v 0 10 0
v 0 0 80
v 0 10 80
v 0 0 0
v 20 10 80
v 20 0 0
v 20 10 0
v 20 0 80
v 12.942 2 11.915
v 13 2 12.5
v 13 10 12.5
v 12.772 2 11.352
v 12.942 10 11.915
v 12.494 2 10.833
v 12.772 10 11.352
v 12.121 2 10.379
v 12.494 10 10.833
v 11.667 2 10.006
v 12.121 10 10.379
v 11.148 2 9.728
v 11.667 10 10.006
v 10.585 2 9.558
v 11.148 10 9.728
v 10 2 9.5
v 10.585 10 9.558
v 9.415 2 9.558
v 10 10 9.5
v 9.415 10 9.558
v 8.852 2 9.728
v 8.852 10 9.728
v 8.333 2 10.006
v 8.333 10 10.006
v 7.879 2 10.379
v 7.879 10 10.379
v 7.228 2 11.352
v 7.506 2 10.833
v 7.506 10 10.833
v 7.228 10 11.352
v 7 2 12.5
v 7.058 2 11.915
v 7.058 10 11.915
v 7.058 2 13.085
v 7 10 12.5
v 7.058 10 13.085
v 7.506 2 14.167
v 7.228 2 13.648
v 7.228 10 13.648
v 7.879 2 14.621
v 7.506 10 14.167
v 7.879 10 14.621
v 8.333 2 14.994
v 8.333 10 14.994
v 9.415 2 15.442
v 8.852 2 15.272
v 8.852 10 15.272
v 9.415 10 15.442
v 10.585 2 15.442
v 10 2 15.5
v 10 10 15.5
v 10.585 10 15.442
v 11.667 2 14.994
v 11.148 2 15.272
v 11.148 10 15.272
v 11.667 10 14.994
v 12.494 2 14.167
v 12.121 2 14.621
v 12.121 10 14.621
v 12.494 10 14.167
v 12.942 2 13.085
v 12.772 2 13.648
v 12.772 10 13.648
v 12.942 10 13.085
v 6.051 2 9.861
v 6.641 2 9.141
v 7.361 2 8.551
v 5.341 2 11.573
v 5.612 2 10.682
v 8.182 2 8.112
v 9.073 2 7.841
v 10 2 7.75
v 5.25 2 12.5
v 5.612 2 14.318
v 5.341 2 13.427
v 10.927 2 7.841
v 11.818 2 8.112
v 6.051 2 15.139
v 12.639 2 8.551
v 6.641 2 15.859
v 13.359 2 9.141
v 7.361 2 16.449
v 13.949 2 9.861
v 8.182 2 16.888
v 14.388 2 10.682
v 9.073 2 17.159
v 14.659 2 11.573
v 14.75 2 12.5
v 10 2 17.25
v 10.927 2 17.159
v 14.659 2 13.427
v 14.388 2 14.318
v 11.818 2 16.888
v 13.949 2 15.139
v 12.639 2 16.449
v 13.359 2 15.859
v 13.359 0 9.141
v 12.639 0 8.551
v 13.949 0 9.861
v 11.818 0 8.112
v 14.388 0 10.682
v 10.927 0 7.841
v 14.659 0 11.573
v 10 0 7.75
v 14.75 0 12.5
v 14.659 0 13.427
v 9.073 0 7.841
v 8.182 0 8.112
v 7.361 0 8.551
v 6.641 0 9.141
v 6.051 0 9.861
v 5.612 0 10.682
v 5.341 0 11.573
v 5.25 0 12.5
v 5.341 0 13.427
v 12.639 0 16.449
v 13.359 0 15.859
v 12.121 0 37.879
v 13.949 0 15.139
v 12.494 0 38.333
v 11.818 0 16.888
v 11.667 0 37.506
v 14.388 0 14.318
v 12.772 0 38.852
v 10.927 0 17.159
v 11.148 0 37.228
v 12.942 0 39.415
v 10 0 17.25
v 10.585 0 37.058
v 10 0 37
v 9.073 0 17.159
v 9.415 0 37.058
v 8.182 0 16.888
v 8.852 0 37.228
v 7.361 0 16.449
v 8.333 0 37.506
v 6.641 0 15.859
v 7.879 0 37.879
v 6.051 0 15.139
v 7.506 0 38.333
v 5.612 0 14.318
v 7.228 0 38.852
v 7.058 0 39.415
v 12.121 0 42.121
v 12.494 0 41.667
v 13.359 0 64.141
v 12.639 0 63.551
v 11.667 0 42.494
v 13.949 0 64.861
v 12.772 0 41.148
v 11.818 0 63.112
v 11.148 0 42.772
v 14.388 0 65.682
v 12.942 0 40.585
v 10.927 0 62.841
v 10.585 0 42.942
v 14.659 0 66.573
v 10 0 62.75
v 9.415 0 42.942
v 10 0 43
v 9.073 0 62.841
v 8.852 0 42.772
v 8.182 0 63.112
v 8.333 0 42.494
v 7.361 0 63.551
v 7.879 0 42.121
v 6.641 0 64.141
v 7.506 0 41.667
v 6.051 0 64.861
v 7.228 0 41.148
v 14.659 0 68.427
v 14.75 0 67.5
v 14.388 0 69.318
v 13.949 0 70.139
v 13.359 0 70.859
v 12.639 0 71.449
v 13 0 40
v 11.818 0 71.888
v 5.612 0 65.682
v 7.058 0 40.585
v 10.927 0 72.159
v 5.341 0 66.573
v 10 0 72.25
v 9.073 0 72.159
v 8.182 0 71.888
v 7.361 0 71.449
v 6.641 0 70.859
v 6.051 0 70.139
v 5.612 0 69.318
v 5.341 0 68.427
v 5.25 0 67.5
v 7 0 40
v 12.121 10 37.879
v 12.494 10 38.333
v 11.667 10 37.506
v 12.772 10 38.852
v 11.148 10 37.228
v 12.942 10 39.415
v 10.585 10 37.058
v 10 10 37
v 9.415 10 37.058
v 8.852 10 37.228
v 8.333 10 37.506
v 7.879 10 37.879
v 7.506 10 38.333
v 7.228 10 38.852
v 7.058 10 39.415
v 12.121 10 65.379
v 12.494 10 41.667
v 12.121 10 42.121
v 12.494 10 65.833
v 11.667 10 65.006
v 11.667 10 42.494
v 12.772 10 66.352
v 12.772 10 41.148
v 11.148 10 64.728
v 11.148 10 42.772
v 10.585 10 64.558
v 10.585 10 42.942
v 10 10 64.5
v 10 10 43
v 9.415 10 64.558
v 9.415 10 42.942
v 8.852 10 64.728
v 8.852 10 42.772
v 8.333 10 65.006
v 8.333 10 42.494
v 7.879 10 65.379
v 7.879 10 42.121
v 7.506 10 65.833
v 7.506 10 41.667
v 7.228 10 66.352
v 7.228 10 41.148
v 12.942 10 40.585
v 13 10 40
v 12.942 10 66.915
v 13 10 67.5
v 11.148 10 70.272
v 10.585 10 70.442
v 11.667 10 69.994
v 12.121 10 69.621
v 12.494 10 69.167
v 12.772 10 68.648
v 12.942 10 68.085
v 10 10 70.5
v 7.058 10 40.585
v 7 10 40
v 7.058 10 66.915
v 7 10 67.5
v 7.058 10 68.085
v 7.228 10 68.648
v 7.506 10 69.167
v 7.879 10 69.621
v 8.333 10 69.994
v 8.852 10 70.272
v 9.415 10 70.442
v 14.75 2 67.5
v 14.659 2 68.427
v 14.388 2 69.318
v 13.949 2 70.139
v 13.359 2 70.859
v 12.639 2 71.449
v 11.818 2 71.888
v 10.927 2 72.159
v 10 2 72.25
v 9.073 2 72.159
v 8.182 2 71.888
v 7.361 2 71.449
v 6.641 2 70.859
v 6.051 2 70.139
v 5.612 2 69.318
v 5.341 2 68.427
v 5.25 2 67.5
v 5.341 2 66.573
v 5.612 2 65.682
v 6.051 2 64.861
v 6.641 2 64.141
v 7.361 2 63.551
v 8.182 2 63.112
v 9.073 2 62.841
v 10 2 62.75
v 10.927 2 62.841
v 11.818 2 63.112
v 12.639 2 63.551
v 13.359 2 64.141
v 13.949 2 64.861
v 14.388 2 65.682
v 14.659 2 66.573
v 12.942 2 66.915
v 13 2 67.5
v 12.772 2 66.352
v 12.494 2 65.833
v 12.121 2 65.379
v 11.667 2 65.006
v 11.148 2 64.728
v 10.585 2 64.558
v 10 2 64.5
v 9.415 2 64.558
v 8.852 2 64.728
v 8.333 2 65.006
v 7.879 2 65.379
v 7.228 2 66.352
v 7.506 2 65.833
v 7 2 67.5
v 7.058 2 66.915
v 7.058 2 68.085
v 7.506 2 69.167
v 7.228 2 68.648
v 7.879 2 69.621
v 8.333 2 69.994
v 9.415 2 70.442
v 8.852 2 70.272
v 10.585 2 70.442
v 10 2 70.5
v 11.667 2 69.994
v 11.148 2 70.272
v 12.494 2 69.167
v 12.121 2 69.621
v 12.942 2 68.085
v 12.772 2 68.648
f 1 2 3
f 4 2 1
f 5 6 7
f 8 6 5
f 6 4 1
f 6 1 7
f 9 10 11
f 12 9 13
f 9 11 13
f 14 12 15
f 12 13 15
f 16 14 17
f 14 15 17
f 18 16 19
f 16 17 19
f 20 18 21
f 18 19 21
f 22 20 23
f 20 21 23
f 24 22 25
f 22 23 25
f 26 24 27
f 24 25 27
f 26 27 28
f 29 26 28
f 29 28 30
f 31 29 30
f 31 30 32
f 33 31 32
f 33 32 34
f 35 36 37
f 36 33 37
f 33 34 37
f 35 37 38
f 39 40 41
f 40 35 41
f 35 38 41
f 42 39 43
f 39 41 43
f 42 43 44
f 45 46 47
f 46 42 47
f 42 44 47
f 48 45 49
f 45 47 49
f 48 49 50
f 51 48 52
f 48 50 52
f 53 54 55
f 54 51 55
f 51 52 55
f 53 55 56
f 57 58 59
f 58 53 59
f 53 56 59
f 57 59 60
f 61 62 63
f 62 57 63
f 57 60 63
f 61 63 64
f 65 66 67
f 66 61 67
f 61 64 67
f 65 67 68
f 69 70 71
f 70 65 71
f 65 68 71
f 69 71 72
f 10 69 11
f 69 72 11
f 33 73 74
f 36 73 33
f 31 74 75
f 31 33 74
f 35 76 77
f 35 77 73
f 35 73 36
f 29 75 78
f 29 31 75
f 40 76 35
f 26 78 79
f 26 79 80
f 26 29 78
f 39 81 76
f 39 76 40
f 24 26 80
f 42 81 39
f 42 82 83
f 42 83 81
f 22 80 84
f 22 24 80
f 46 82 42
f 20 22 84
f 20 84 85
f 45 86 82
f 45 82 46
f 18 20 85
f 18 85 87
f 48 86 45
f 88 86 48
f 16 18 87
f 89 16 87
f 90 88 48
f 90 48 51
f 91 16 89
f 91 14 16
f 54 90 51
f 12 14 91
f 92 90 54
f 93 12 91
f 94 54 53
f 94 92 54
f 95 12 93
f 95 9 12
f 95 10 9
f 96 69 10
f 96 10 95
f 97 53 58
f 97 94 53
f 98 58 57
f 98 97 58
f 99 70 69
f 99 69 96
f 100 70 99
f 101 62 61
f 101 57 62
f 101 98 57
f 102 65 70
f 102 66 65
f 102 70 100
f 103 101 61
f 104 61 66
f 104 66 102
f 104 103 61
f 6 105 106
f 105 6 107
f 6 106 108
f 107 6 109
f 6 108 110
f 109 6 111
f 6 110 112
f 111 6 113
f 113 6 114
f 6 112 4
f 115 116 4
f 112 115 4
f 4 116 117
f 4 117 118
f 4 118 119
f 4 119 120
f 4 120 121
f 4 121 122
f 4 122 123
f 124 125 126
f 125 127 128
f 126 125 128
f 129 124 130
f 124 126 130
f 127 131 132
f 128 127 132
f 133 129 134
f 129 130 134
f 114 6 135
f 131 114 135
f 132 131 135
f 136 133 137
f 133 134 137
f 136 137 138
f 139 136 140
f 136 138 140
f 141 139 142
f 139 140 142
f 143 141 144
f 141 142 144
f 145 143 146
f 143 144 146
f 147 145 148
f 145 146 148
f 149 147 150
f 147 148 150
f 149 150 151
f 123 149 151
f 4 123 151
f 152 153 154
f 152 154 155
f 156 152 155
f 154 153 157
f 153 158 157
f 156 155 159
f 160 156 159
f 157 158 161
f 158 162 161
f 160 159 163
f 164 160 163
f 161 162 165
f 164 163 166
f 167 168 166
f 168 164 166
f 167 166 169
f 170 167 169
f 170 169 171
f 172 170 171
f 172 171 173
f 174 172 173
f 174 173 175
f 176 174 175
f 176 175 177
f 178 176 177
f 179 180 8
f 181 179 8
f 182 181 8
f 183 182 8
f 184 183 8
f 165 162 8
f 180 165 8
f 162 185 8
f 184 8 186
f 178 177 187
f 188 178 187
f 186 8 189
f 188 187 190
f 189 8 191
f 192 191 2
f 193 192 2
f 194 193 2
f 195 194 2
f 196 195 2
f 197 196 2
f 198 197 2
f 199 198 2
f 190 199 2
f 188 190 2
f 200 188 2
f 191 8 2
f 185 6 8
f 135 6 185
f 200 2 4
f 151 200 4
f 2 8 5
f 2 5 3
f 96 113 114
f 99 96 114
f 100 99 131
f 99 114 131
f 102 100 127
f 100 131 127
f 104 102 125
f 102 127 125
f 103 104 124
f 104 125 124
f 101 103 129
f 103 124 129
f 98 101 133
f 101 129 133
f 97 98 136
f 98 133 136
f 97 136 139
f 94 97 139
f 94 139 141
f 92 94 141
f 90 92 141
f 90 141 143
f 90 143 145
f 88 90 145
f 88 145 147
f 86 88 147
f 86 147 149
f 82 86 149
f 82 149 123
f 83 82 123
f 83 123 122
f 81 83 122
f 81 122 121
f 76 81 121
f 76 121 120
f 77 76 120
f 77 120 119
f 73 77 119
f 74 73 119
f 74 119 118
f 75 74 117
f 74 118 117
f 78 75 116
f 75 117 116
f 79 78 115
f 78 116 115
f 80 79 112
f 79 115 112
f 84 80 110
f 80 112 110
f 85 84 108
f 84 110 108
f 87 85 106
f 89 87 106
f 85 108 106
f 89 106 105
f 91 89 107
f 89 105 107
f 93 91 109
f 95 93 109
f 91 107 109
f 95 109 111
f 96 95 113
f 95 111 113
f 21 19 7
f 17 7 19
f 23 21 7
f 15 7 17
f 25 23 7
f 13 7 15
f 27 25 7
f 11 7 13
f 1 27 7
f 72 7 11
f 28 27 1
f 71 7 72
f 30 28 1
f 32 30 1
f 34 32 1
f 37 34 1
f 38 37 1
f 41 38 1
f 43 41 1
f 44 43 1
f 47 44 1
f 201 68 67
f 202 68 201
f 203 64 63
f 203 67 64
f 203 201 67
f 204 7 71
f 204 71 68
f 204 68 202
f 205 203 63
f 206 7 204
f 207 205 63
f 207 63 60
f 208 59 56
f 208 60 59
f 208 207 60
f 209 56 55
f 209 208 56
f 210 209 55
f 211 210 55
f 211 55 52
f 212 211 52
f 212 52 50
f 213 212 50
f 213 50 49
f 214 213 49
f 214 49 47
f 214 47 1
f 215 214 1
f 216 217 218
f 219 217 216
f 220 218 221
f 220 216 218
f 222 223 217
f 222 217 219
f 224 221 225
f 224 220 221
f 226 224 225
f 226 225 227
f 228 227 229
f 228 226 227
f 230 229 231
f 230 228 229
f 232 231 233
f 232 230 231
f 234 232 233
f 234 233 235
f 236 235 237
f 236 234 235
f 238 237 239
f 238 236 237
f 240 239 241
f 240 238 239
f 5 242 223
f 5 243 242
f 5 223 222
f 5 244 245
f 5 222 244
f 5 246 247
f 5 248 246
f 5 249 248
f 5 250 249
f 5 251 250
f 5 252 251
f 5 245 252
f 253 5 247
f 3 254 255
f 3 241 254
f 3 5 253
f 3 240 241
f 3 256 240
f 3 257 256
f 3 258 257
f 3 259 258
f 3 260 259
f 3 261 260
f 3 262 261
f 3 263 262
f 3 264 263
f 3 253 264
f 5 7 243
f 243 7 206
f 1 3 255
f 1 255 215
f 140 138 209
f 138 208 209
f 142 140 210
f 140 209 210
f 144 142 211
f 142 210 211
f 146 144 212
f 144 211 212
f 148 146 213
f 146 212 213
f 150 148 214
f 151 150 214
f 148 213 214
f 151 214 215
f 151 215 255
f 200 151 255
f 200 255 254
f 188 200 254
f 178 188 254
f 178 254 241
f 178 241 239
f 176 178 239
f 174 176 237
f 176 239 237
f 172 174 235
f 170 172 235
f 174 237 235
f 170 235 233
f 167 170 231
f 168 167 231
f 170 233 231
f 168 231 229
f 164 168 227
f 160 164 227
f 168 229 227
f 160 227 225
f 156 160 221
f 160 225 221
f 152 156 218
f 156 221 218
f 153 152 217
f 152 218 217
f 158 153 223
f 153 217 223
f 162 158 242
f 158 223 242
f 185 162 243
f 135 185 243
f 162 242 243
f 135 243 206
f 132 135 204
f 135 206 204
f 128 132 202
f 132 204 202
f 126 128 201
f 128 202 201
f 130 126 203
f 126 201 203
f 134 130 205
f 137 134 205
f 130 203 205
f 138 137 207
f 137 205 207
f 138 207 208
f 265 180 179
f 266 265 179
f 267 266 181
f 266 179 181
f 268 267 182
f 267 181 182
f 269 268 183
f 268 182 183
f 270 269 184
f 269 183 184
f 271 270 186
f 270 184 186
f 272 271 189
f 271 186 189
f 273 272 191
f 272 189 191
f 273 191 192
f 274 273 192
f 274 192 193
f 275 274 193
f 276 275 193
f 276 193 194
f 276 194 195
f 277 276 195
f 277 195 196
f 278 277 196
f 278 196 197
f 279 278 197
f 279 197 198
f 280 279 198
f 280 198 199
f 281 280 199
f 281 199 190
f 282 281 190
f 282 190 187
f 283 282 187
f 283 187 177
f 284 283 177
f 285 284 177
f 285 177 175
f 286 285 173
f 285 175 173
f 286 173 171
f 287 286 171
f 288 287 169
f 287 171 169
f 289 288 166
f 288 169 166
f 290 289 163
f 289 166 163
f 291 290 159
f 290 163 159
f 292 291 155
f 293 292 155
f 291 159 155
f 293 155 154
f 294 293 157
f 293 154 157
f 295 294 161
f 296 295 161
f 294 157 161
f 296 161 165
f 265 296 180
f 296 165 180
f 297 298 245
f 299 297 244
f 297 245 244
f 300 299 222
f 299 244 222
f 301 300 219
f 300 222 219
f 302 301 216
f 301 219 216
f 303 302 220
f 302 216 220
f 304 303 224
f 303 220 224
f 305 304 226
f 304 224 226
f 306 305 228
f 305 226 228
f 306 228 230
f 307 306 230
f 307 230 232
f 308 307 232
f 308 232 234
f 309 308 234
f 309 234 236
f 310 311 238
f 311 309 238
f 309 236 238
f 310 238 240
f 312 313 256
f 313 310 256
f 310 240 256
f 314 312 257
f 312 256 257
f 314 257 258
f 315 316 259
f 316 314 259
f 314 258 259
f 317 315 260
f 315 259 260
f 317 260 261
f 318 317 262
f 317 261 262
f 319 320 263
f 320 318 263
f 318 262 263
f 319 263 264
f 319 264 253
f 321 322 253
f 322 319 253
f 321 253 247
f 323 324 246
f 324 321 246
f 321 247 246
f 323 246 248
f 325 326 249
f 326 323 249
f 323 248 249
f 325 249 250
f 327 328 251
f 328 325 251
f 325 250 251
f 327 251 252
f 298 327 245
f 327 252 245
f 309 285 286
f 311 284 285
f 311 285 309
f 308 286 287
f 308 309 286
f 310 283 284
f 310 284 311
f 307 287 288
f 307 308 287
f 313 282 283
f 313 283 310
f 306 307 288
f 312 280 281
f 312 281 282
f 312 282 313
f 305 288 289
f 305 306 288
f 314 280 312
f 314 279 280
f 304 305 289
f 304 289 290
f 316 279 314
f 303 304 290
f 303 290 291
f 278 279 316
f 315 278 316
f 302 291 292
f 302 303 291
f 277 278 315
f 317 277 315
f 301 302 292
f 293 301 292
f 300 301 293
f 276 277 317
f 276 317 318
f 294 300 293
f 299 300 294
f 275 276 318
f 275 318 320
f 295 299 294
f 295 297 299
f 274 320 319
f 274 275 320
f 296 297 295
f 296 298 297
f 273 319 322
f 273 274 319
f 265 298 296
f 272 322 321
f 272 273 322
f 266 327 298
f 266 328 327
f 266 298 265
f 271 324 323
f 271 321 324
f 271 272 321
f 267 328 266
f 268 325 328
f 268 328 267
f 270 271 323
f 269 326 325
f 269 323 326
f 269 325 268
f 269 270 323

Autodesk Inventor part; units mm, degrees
ref_plane "YZ Plane" through (0, 0, 0) normal (1, 0, 0) x (0, 1, 0)
ref_plane "XZ Plane" through (0, 0, 0) normal (0, 1, 0) x (-1, 0, 0)
ref_plane "XY Plane" through (0, 0, 0) normal (0, 0, 1) x (1, 0, 0)
sketch "Sketch1" plane through (0, 0, 0) normal (0, 1, 0) x (-1, 0, 0)
  line L0 (0, 0) -> (-20, 0)
  line L1 (-20, 0) -> (-20, 80)
  line L2 (-20, 80) -> (0, 80)
  line L3 (0, 80) -> (0, 0)
  dimension "d0" = 20
  dimension "d1" = 80
extrude "Extrusion1" add sketch "Sketch1" along normal blind 10
sketch "Sketch2" plane through (0, 10, 0) normal (0, 1, 0) x (1, 0, 0)
  circle A0 centre (10, -67.5) radius 3
  circle A1 centre (10, -12.5) radius 3
  line L0 (0, -80) -> (20, -80) projected
  line L1 (20, 0) -> (0, 0) projected
  point P0 (10, -80)
  point P1 (10, 0)
  dimension "d4" = 6
  dimension "d5" = 6
  dimension "d6" = 12.5
  dimension "d7" = 12.5
extrude "Extrusion2" cut sketch "Sketch2" against normal through all
sketch "Sketch3" plane through (0, 0, 0) normal (0, -1, 0) x (1, 0, 0)
  circle A0 centre (10, 67.5) radius 3 projected
  circle A1 centre (10, 67.5) radius 4.75
  circle A2 centre (10, 12.5) radius 3 projected
  circle A3 centre (10, 12.5) radius 4.75
  point P0 (0, 0)
  dimension "d10" = 9.5
  dimension "d11" = 9.5
extrude "Extrusion3" cut sketch "Sketch3" against normal blind 2
sketch "Sketch4" plane through (0, 0, 0) normal (0, -1, 0) x (1, 0, 0)
  line L0 (20, 80) -> (20, 0) projected
  line L1 (0, 80) -> (20, 80) projected
  point P0 (0, 0)
  point P1 (10, 40)
sketch "Sketch6" plane through (0, 10, 0) normal (0, 1, 0) x (1, 0, 0)
  circle A0 centre (10, -12.5) radius 3 projected
  circle A1 centre (10, -67.5) radius 3 projected
  line L0 (0, -80) -> (20, -80) projected
  line L1 (20, -80) -> (20, 0) projected
  line L2 (20, 0) -> (0, 0) projected
  line L3 (0, 0) -> (0, -80) projected
hole "Hole2" at (10, 0, 40) direction (0, 1, 0) diameter 6 depth 22.931
properties part number "Base mounting to extrusion_3DPrint"
